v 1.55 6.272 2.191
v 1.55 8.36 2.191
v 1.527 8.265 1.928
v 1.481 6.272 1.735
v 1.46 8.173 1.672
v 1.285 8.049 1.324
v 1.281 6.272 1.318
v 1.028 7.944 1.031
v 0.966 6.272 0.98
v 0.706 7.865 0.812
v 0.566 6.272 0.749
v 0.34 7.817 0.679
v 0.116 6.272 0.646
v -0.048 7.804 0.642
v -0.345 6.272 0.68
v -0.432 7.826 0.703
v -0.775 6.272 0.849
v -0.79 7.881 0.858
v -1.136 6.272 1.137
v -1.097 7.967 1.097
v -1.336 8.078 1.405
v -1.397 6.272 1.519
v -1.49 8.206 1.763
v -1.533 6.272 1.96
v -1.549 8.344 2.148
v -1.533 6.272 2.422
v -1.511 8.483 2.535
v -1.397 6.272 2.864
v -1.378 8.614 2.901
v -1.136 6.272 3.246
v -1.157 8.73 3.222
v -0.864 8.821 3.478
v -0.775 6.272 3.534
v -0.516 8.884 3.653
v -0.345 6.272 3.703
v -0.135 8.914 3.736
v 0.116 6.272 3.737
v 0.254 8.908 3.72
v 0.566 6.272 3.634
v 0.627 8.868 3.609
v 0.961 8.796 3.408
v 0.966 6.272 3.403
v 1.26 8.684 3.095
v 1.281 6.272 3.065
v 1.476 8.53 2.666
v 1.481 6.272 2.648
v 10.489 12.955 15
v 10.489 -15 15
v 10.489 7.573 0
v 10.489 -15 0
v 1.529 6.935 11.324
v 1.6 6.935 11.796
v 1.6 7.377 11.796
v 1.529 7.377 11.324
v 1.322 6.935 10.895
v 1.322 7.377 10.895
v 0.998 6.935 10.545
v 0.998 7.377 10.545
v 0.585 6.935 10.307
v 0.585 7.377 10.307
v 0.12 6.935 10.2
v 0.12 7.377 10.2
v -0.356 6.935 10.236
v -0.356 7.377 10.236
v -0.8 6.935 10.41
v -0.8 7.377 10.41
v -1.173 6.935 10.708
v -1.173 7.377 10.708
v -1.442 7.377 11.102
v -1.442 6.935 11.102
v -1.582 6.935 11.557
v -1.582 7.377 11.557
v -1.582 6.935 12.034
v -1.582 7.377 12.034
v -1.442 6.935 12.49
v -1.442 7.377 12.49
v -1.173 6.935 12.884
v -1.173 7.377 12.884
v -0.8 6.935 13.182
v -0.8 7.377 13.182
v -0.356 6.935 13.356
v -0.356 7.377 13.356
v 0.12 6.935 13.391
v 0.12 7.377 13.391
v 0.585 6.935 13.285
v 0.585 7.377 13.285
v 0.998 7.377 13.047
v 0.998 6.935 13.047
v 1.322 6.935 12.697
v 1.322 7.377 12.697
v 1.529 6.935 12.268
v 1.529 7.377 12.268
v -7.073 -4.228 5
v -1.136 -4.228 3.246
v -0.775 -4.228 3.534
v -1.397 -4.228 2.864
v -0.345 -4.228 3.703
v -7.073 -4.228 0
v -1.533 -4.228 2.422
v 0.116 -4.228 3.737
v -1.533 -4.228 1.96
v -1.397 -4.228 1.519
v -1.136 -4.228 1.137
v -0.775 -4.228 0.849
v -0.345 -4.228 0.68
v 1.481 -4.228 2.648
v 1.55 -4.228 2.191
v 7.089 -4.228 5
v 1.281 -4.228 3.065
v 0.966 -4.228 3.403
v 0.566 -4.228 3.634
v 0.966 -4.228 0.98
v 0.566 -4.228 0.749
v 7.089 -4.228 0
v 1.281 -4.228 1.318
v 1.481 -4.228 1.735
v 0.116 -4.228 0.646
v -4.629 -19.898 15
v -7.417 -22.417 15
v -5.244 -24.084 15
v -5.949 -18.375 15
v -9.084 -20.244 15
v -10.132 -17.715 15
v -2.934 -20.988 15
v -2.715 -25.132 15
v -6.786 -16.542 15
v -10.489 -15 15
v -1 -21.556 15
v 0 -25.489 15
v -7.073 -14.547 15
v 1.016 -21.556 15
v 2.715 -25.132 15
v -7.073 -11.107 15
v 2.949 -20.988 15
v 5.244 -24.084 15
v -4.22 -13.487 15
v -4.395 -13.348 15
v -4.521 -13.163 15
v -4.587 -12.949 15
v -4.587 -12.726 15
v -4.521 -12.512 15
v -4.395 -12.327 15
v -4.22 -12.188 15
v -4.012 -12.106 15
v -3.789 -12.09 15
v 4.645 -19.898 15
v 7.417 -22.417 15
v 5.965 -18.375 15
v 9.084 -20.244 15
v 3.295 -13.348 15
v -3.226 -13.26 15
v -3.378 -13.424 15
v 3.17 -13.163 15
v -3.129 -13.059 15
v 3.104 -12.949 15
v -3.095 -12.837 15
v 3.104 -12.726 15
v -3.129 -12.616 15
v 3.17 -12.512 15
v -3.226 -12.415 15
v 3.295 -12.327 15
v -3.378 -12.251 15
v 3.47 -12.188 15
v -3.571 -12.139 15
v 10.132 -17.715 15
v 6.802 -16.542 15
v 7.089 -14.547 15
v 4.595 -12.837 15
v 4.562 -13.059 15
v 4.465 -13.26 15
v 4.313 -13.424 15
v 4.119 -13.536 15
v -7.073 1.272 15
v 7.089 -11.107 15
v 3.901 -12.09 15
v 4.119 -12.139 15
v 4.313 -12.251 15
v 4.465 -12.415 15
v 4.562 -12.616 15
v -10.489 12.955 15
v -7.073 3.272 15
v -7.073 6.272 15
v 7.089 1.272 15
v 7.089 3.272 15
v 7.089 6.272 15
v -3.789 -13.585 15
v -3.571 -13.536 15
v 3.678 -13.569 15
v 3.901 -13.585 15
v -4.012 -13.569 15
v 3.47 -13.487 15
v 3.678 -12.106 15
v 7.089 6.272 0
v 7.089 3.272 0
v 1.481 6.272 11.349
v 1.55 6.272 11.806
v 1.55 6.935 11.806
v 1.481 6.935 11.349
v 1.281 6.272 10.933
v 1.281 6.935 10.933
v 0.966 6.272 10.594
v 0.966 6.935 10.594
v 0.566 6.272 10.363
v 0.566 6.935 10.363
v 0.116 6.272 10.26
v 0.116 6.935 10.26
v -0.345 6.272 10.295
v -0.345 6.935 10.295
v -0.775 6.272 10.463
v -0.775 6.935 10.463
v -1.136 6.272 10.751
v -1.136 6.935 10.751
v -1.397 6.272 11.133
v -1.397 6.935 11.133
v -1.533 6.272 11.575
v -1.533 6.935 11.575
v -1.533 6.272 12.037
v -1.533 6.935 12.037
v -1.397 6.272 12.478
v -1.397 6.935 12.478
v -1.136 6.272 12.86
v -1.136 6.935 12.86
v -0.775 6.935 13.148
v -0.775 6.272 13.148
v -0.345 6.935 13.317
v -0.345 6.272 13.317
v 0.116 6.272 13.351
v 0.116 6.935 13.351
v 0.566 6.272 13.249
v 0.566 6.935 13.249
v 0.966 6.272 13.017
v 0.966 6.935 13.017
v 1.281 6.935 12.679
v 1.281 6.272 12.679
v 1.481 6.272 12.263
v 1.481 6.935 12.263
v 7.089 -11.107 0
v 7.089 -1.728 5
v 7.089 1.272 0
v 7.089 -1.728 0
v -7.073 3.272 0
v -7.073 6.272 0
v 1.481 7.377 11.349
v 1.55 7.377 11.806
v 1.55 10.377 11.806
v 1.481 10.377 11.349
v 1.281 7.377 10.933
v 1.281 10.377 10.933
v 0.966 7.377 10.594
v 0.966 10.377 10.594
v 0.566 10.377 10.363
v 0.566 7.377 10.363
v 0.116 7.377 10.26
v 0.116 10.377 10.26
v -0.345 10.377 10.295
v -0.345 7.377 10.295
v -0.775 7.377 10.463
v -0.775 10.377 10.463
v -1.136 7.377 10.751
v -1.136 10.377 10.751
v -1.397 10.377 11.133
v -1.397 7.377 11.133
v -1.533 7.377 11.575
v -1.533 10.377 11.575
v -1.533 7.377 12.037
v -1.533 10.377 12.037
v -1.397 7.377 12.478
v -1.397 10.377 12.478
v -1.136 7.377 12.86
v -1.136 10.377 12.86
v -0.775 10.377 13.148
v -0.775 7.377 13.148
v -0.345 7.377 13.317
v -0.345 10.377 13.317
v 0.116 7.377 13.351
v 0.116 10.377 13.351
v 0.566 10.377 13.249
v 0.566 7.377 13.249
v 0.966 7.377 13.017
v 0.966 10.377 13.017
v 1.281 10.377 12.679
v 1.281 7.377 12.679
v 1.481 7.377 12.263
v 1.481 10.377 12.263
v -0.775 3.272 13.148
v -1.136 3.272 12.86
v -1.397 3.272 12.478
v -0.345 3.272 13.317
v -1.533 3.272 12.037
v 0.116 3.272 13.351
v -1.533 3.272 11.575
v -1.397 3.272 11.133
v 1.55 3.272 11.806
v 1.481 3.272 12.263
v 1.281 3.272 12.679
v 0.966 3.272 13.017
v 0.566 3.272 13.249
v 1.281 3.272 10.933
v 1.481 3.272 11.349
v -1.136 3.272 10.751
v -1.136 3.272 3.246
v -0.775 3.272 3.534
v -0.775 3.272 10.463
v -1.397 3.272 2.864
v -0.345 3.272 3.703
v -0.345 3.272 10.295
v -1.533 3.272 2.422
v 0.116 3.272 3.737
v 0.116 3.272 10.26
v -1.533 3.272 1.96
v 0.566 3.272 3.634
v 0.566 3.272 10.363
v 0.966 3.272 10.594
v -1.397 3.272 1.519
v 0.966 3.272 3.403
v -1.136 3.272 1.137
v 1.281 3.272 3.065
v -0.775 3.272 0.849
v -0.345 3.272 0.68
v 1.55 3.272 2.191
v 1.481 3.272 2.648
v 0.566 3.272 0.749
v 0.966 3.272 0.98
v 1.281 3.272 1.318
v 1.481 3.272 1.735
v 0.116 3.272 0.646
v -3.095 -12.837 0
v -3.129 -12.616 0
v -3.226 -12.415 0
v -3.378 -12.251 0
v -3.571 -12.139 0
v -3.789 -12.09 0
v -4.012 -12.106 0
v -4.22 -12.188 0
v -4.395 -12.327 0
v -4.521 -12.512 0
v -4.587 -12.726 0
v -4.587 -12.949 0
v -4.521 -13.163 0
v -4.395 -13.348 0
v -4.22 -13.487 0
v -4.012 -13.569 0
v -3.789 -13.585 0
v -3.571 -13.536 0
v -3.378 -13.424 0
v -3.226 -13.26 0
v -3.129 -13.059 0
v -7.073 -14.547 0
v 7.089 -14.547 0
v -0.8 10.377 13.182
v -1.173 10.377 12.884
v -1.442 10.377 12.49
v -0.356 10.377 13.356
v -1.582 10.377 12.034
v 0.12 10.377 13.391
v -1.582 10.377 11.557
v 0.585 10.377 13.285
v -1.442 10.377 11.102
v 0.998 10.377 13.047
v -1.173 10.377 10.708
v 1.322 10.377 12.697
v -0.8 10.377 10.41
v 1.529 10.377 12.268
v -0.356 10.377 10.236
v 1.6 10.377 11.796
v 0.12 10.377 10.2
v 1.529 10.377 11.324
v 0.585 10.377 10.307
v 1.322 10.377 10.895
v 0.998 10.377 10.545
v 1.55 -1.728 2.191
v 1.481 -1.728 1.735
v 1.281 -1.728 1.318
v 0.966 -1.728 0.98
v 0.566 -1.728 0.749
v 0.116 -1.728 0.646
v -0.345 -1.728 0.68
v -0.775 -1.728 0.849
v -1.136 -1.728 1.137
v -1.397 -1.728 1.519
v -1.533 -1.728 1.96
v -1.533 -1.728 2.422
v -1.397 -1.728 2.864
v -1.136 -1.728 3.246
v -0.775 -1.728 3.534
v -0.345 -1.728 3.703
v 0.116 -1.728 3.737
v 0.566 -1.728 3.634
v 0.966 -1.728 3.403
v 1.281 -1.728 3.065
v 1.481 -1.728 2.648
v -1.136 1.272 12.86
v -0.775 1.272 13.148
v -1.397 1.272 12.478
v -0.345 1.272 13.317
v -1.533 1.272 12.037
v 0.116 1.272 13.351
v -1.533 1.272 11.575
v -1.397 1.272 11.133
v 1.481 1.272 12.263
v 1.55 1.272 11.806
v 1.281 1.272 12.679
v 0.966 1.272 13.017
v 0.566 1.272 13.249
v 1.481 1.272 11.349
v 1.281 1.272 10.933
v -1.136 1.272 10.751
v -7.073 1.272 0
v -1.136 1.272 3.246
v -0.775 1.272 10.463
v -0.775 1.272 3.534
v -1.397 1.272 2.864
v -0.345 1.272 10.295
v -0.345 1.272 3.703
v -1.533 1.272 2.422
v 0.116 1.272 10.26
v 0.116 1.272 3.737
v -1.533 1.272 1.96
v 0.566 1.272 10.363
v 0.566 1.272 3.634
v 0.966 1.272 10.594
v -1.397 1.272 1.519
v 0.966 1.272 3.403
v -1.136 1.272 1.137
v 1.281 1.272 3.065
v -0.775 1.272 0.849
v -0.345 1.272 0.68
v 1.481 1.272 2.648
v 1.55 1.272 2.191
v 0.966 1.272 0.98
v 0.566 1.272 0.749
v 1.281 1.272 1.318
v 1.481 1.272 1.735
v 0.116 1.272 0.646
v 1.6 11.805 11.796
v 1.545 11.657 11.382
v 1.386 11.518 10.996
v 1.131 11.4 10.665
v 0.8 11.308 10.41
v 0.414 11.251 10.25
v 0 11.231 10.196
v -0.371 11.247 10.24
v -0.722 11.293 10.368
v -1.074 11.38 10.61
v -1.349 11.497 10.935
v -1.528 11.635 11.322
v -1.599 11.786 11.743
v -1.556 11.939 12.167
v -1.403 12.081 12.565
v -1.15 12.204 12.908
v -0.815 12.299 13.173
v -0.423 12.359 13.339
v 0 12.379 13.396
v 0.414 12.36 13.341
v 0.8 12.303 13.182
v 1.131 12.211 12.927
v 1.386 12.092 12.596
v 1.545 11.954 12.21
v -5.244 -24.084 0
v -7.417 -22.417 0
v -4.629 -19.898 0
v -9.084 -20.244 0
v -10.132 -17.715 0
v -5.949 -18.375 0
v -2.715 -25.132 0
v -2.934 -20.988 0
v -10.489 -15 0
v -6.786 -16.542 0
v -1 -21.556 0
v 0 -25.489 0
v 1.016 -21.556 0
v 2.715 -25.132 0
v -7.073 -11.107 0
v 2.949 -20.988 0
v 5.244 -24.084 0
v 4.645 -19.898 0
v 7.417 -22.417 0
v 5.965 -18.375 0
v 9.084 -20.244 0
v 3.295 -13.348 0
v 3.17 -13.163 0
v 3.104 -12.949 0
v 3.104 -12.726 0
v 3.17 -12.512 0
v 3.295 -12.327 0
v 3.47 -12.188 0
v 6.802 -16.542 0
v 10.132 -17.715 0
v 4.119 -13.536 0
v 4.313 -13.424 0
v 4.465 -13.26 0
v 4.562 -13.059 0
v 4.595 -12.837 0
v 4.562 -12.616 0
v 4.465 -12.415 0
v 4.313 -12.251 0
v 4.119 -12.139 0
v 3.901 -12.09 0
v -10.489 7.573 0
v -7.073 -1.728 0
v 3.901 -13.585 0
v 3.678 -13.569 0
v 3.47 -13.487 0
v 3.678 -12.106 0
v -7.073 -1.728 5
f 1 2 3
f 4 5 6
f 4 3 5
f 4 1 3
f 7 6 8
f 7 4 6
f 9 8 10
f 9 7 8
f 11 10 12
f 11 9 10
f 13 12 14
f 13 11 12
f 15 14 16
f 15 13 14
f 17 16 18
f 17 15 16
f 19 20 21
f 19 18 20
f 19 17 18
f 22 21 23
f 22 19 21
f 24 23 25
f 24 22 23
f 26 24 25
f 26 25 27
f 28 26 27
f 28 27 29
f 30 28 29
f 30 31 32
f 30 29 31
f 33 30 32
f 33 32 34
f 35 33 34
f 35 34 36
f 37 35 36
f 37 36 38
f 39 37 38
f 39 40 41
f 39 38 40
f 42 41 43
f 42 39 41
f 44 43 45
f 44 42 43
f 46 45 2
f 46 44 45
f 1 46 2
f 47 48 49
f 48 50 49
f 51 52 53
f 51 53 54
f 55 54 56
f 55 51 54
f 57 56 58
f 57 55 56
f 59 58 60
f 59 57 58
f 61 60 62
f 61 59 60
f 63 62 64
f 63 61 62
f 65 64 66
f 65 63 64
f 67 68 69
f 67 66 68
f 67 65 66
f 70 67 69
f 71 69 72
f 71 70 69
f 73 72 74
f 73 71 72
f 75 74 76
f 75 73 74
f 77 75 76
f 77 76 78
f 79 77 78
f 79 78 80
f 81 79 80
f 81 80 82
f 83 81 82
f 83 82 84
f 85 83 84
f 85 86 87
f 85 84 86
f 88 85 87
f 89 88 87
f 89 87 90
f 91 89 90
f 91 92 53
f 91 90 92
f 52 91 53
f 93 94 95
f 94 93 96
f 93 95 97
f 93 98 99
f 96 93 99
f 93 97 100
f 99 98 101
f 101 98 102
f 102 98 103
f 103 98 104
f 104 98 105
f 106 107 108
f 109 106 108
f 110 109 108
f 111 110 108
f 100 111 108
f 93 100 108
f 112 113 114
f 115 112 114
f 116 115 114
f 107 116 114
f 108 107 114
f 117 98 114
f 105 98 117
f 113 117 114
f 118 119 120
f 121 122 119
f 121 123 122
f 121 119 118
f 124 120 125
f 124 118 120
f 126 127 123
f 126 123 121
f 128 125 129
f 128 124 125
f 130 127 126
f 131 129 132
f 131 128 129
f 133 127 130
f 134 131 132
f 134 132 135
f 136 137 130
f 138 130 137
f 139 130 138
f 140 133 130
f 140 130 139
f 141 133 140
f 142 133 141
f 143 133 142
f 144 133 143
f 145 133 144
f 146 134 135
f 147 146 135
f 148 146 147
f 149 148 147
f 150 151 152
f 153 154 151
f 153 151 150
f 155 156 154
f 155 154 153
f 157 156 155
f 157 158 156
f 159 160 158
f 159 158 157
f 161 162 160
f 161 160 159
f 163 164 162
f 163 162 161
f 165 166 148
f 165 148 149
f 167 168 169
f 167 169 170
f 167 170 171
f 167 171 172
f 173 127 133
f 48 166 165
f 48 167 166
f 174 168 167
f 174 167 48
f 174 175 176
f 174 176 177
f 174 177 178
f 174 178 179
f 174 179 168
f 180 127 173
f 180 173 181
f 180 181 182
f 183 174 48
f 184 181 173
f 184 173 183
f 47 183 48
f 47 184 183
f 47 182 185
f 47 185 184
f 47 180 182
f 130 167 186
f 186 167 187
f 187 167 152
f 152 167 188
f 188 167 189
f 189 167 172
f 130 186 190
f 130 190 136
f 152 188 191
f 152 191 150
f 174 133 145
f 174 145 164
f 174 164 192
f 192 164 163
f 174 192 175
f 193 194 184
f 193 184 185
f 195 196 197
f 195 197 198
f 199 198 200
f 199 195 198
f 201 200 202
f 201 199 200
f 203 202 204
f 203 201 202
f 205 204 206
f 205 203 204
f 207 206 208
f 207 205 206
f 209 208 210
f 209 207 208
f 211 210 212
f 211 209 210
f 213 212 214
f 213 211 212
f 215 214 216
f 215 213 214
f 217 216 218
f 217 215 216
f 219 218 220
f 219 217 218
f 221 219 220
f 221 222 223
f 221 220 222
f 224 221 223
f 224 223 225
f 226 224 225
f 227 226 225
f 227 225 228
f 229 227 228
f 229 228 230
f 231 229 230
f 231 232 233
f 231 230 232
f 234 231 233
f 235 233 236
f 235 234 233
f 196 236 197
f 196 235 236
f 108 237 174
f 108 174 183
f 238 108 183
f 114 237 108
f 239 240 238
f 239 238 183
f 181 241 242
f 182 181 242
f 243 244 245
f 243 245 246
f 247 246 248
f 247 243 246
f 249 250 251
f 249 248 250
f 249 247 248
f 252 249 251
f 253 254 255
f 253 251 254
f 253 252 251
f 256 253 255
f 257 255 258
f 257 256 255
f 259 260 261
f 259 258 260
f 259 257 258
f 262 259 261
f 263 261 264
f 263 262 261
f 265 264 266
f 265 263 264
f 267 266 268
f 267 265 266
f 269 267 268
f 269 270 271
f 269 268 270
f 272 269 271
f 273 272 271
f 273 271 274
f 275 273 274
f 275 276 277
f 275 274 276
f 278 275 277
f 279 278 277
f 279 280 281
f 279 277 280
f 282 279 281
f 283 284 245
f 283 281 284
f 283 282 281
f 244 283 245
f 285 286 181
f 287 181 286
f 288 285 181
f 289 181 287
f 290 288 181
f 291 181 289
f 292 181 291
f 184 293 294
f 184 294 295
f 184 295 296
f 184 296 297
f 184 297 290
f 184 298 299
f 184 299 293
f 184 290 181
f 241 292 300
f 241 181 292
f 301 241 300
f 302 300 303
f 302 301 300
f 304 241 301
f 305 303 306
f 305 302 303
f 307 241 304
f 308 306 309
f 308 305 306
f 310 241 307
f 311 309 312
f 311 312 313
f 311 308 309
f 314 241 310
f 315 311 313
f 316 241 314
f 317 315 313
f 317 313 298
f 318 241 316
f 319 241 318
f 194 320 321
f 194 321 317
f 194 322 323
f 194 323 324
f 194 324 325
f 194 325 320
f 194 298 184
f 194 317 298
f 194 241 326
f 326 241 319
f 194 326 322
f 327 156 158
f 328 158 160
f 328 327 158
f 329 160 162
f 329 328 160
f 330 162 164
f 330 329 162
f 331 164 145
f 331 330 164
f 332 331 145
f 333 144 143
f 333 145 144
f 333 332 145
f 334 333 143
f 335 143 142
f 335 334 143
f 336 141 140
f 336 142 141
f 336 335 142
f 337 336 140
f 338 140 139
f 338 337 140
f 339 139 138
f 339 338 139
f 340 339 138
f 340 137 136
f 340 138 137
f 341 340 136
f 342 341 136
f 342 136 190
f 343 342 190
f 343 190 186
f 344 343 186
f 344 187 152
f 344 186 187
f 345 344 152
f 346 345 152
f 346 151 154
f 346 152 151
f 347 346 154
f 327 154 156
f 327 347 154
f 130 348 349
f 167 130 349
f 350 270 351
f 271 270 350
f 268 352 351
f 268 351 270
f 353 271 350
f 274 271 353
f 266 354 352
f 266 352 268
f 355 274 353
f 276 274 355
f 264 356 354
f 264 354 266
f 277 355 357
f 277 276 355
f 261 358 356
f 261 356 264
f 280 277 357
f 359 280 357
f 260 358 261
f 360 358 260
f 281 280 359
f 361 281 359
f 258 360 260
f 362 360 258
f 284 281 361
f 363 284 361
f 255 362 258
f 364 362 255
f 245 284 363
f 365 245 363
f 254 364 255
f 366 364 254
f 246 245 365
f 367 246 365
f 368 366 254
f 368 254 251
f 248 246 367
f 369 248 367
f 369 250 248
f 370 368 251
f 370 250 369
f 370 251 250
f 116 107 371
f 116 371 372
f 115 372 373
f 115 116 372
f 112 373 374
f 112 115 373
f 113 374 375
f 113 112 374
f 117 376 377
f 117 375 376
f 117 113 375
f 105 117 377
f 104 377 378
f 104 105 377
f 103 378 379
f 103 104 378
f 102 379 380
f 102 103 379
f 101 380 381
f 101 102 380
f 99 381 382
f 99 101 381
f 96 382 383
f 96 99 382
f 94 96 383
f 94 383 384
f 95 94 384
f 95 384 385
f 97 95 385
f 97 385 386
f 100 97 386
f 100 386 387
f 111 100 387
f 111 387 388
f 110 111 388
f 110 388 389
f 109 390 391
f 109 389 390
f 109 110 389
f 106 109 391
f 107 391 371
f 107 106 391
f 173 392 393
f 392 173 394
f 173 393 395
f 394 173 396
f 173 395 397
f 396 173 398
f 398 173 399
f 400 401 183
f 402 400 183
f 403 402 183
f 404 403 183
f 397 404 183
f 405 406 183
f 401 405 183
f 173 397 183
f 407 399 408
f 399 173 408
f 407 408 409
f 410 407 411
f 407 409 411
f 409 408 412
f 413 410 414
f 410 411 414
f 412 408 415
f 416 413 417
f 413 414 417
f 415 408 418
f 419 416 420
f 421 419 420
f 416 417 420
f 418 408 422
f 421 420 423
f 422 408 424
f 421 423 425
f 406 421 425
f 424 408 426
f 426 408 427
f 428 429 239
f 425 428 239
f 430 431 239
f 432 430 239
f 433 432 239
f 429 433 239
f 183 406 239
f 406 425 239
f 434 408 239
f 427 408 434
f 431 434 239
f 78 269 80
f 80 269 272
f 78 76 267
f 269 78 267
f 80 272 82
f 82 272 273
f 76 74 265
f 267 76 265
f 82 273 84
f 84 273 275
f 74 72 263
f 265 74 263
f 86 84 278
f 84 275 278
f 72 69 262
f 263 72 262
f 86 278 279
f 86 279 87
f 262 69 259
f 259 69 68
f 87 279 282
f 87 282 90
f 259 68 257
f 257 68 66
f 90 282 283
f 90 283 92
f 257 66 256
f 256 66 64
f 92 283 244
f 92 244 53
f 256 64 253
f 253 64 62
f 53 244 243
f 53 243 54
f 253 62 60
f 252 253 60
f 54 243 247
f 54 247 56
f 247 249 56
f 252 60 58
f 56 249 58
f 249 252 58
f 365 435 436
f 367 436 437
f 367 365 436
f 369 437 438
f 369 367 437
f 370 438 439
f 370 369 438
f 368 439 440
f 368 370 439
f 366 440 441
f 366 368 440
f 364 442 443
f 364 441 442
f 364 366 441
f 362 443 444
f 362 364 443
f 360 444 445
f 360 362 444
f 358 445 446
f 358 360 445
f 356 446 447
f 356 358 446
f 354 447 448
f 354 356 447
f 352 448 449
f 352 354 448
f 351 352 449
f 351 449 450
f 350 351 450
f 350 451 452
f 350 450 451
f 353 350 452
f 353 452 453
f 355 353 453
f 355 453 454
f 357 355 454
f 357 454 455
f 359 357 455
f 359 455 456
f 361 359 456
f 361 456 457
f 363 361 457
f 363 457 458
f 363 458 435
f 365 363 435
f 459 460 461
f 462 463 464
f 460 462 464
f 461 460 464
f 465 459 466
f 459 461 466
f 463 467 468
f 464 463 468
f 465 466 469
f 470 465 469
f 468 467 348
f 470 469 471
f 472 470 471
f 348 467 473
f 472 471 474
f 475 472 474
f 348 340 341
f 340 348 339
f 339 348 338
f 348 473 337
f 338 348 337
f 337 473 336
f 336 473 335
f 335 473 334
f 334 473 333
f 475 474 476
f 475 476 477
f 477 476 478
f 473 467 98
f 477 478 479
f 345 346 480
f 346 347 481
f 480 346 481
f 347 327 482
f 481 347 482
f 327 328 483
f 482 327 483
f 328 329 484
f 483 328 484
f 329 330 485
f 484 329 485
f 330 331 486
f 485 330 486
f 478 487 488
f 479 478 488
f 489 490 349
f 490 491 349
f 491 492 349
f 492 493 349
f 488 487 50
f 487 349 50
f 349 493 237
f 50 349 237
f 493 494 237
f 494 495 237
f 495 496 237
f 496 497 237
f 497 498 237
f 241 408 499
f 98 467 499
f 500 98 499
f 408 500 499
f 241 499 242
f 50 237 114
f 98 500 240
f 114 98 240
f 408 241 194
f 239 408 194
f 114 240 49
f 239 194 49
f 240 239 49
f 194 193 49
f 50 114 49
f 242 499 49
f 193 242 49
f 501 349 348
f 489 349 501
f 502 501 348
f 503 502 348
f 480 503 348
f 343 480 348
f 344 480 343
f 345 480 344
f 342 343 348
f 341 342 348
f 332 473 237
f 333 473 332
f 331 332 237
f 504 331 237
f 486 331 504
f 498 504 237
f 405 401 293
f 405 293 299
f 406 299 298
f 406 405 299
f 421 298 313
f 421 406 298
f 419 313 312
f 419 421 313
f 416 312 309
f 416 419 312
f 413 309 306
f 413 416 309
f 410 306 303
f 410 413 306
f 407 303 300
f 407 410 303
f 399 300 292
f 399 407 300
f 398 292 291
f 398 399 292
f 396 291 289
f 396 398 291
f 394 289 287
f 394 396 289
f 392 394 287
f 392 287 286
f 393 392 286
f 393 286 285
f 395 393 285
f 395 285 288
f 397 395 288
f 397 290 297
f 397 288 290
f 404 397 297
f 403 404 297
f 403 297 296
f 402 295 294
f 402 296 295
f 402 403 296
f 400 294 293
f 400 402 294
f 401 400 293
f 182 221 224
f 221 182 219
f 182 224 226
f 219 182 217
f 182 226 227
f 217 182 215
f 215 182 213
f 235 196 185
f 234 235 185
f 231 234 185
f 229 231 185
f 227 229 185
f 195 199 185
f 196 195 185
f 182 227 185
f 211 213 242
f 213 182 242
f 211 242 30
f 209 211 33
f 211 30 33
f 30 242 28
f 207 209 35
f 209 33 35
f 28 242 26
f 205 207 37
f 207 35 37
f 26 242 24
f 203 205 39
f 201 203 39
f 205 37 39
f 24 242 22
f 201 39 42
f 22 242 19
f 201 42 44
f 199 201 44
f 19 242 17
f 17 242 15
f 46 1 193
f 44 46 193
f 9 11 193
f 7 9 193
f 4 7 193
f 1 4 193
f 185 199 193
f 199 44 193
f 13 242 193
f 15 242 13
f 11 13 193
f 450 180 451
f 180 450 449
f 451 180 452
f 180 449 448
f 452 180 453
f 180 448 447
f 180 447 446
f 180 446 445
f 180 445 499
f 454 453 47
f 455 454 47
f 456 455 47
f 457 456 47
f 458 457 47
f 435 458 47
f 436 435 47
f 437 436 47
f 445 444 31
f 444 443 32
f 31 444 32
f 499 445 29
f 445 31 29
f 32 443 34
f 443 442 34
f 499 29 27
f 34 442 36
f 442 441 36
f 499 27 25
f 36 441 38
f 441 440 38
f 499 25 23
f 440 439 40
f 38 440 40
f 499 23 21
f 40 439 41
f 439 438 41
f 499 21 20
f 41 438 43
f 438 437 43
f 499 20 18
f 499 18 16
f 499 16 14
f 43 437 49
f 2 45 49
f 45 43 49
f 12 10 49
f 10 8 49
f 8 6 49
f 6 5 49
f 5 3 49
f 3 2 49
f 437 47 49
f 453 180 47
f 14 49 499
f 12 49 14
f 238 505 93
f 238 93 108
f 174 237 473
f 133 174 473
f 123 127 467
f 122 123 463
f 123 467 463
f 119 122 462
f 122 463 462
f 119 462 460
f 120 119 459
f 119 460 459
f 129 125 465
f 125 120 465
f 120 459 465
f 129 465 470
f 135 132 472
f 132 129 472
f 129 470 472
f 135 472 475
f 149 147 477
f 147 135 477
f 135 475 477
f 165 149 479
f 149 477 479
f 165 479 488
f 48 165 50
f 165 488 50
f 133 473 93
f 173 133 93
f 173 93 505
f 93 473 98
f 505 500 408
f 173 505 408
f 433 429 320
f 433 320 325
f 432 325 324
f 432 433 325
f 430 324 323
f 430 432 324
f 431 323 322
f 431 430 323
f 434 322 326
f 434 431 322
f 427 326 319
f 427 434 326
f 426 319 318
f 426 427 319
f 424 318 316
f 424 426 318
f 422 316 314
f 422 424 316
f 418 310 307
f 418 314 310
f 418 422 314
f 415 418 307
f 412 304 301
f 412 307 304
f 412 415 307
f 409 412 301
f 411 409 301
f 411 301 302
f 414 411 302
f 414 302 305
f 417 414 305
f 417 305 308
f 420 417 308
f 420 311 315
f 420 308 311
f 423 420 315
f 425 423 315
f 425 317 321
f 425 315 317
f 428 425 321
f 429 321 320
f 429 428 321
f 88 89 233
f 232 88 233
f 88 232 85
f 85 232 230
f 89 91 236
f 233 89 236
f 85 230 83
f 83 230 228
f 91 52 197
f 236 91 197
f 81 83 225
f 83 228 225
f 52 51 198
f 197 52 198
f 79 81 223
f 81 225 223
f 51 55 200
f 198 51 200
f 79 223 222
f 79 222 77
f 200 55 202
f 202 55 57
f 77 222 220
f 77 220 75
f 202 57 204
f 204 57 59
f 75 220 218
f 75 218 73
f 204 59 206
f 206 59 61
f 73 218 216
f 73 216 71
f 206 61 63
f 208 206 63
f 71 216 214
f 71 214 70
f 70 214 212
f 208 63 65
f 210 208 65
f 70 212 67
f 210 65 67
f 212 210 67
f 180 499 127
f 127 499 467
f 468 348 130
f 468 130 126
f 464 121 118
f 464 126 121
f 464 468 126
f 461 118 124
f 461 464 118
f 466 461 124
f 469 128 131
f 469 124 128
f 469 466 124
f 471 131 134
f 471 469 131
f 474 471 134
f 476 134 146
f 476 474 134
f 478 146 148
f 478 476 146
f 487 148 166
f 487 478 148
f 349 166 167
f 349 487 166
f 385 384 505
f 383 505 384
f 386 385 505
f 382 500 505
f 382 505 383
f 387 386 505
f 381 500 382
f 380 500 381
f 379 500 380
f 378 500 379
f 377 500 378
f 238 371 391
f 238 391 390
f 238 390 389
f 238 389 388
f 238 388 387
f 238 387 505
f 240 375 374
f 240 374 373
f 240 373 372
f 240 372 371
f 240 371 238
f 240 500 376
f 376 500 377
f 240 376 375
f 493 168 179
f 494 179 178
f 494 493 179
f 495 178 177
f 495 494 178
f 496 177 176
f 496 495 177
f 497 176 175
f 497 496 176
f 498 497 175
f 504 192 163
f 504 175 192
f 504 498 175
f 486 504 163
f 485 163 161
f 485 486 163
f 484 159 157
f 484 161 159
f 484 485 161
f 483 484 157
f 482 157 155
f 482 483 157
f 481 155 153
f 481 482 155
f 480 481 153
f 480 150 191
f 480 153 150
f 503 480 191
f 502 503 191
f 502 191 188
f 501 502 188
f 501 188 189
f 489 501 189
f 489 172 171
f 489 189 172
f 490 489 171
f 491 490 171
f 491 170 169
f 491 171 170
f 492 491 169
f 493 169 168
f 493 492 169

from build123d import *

# Parameters (mm, degrees)
SKETCH2_W                = 14.162138344
SKETCH2_H                = 3.4
SKETCH2_W_2              = 7.073181434
SKETCH2_H_2              = 3.44
SKETCH2_R                = 0.75
SKETCH2_W_3              = 7.08895691
BOSS_EXTRUDE1_DEPTH      = 20
BOSS_EXTRUDE2_START      = -11
BOSS_EXTRUDE2_DEPTH      = 23
CUT_EXTRUDE1_DEPTH       = 23
BOSS_EXTRUDE3_DEPTH      = 20
SKETCH8_R                = 1.6
CUT_EXTRUDE2_DEPTH       = 50
CUT_EXTRUDE3_START       = 9
SKETCH9_W                = 15
SKETCH9_H                = 3
CUT_EXTRUDE3_DEPTH       = 50
SKETCH10_W               = 8
SKETCH10_H               = 3.4
BOSS_EXTRUDE4_DEPTH      = 20
CUT_EXTRUDE4_DEPTH       = 15
CUT_EXTRUDE6_DEPTH       = 15
CUT_EXTRUDE7_DEPTH       = 14.77685015
CUT_EXTRUDE7_DEPTH_BACK  = 26.48895691
CUT_EXTRUDE8_DEPTH       = 11.48895691
CUT_EXTRUDE8_DEPTH_BACK  = 11.48895691
CUT_EXTRUDE9_DEPTH       = 11.48895691
CUT_EXTRUDE9_DEPTH_BACK  = 11.48895691
SKETCH16_W               = 14.162138344
SKETCH16_H               = 9.377104558
CUT_EXTRUDE10_DEPTH      = 16.0000001
CUT_EXTRUDE10_DEPTH_BACK = 15.024346574
BOSS_EXTRUDE5_DEPTH      = 15
SKETCH18_W               = 14.162138344
SKETCH18_H               = 2
BOSS_EXTRUDE6_DEPTH      = 15
SKETCH19_W               = 15
SKETCH19_H               = 3
BOSS_EXTRUDE7_DEPTH      = 15
CUT_EXTRUDE11_DEPTH      = 11.48895691
CUT_EXTRUDE11_DEPTH_BACK = 11.48895691
SKETCH21_R               = 1.55
CUT_EXTRUDE12_DEPTH      = 20
SKETCH23_W               = 14.162138344
SKETCH23_H               = 12.378444436
CUT_EXTRUDE13_DEPTH      = 16
CUT_EXTRUDE13_DEPTH_BACK = 15.024346574
SKETCH24_W               = 14.162138344
SKETCH24_H               = 2.5
BOSS_EXTRUDE8_DEPTH      = 5
CUT_EXTRUDE14_START      = -10
SKETCH25_R               = 1.55
CUT_EXTRUDE14_DEPTH      = 20


with BuildPart() as part:
    # Sketch2 → Boss-Extrude1 (new body)
    with BuildSketch(Plane.XY):
        with BuildLine():
            Line((-10.48895691, 0), (-10.48895691, -15))
            ThreePointArc((-10.48895691, -15), (0, -25.48895691), (10.48895691, -15))
            Line((10.48895691, -15), (10.48895691, 0))
            ThreePointArc((10.48895691, 0), (0, 10.48895691), (-10.48895691, 0))
        make_face()
        with BuildLine():
            ThreePointArc((-7.073181434, -14.546841059), (0.007887738, -21.627910231), (7.08895691, -14.546841059))
            Line((7.08895691, -14.546841059), (7.08895691, -0.433251968))
            ThreePointArc((7.08895691, -0.433251968), (0.007887738, 6.647817204), (-7.073181434, -0.433251968))
            Line((-7.073181434, -0.433251968), (-7.073181434, -14.546841059))
        make_face(mode=Mode.SUBTRACT)
        with Locations((0.007887738, -4.477329194)):
            Rectangle(SKETCH2_W, SKETCH2_H)
        with Locations((-3.536590717, -12.826841059)):
            Rectangle(SKETCH2_W_2, SKETCH2_H_2)
        with Locations((-3.845252141, -12.837457066)):
            Circle(SKETCH2_R, mode=Mode.SUBTRACT)
        with Locations((3.544478455, -12.826841059)):
            Rectangle(SKETCH2_W_3, SKETCH2_H_2)
        with Locations((3.845252141, -12.837457066)):
            Circle(SKETCH2_R, mode=Mode.SUBTRACT)
    extrude(amount=BOSS_EXTRUDE1_DEPTH)



with BuildPart() as body_2:
    # Sketch5 → Boss-Extrude2 (new body)
    with BuildSketch(Plane(origin=(0, 0, 0), x_dir=(0, 0, -1), z_dir=(1, 0, 0)).offset(BOSS_EXTRUDE2_START)):
        Polygon((-20, 10.48895691), (-20, 13.77685015), (0, 10.48895691), align=None)
    extrude(amount=BOSS_EXTRUDE2_DEPTH)

    # Sketch6 → Cut-Extrude1 (cut)
    with BuildSketch(Plane.XY):
        Polygon((-10.48895691, 0), (-10.48895691, 15.860273687), (-12.486191968, 15.860273687), (-12.486191968, -0.695838208), align=None)
        Polygon((10.48895691, 0), (10.48895691, 17.140856928), (14.451791198, 17.140856928), (14.085910272, 0), align=None)
    extrude(amount=CUT_EXTRUDE1_DEPTH, mode=Mode.SUBTRACT)


with BuildPart() as part_1:
    add(part.part)

    add(body_2.part)  # Boss-Extrude3 merges body 2
    # Sketch7 → Boss-Extrude3 (add)
    with BuildSketch(Plane.XY):
        Polygon((-10.48895691, 10.48895691), (-10.48895691, 0), (-4.00693271, 9.117877526), (3.3932631, 9.117877526), (10.48895691, 0), (10.48895691, 10.48895691), align=None)
    extrude(amount=BOSS_EXTRUDE3_DEPTH)

    # Sketch8 → Cut-Extrude2 (cut)
    with BuildSketch(Plane(origin=(0, 0, 0), x_dir=(1, 0, 0), z_dir=(0, 1, 0))):
        with Locations((0, -11.795956347)):
            Circle(SKETCH8_R)
    extrude(amount=CUT_EXTRUDE2_DEPTH, mode=Mode.SUBTRACT)

    # Sketch9 → Cut-Extrude3 (cut)
    with BuildSketch(Plane.XY.offset(CUT_EXTRUDE3_START)):
        with Locations((0, 8.87685015)):
            Rectangle(SKETCH9_W, SKETCH9_H)
    extrude(amount=CUT_EXTRUDE3_DEPTH, mode=Mode.SUBTRACT)

    # Sketch10 → Boss-Extrude4 (add)
    with BuildSketch(Plane.XY):
        with Locations((0, -4.477329194)):
            Rectangle(SKETCH10_W, SKETCH10_H)
    extrude(amount=-BOSS_EXTRUDE4_DEPTH)

    # Sketch11 → Cut-Extrude4 (cut)
    with BuildSketch(Plane(origin=(0, 0, 0), x_dir=(1, 0, 0), z_dir=(0, 1, 0))):
        with BuildLine():
            ThreePointArc((4, 27.93345462), (0, 23.93345462), (-4, 27.93345462))
            Line((-4, 27.93345462), (-5.669072563, 15.992564213))
            Line((-5.669072563, 15.992564213), (5.557395145, 15.474390906))
            Line((5.557395145, 15.474390906), (4, 27.93345462))
        make_face()
    extrude(amount=-CUT_EXTRUDE4_DEPTH, mode=Mode.SUBTRACT)

    # Sketch12 → Cut-Extrude6 (cut)
    with BuildSketch(Plane(origin=(0, 0, 0), x_dir=(1, 0, 0), z_dir=(0, 1, 0))):
        with BuildLine():
            ThreePointArc((-1.5, 10), (0, 8.5), (1.5, 10))
            ThreePointArc((1.5, 10), (1.499895352, 10.017718186), (1.499581421, 10.0354339))
            Line((1.499581421, 10.0354339), (-1.499581421, 10.0354339))
            ThreePointArc((-1.499581421, 10.0354339), (-1.499895352, 10.017718186), (-1.5, 10))
        make_face()
        with BuildLine():
            Line((-1.499581421, 10.0354339), (1.499581421, 10.0354339))
            ThreePointArc((1.499581421, 10.0354339), (0, 11.5), (-1.499581421, 10.0354339))
        make_face()
        with BuildLine():
            Line((-1.5, 0), (1.5, 0))
            Line((1.5, 0), (1.5, 10))
            ThreePointArc((1.5, 10), (0, 8.5), (-1.5, 10))
            Line((-1.5, 10), (-1.5, 0))
        make_face()
    extrude(amount=-CUT_EXTRUDE6_DEPTH, mode=Mode.SUBTRACT)

    # Sketch13 → Cut-Extrude7 (cut, two sides)
    with BuildSketch(Plane(origin=(0, 0, 0), x_dir=(1, 0, 0), z_dir=(0, 1, 0))) as cut_extrude7_sk:
        with BuildLine():
            Line((-7.439128098, 19.178498244), (-4, 10.024346574))
            ThreePointArc((-4, 10.024346574), (0, 14.024346574), (4, 10.024346574))
            Line((4, 10.024346574), (9.668085042, 17.513702334))
            Line((9.668085042, 17.513702334), (-7.439128098, 19.178498244))
        make_face()
    extrude(amount=CUT_EXTRUDE7_DEPTH, mode=Mode.SUBTRACT)
    extrude(cut_extrude7_sk.sketch, amount=-CUT_EXTRUDE7_DEPTH_BACK, mode=Mode.SUBTRACT)

    # Sketch14 → Cut-Extrude8 (cut, two sides)
    with BuildSketch(Plane(origin=(0, 0, 0), x_dir=(0, 0, -1), z_dir=(1, 0, 0))) as cut_extrude8_sk:
        Polygon((-26.730054166, 15.422520577), (-23.0368577, -28.4462079), (-15, -25.48895691), (-15, 13.72392169), align=None)
    extrude(amount=CUT_EXTRUDE8_DEPTH, mode=Mode.SUBTRACT)
    extrude(cut_extrude8_sk.sketch, amount=-CUT_EXTRUDE8_DEPTH_BACK, mode=Mode.SUBTRACT)

    # Sketch15 → Cut-Extrude9 (cut, two sides)
    with BuildSketch(Plane(origin=(0, 0, 0), x_dir=(0, 0, -1), z_dir=(1, 0, 0))) as cut_extrude9_sk:
        Polygon((-15, 12.95487684), (0, 7.573497647), (5.521522654, 8.824312447), (5.521522654, 13.501272135), (-15.144113177, 13.990721405), align=None)
    extrude(amount=CUT_EXTRUDE9_DEPTH, mode=Mode.SUBTRACT)
    extrude(cut_extrude9_sk.sketch, amount=-CUT_EXTRUDE9_DEPTH_BACK, mode=Mode.SUBTRACT)

    # Sketch16 → Cut-Extrude10 (cut, two sides)
    with BuildSketch(Plane.XY) as cut_extrude10_sk:
        with Locations((0.007887738, 1.911223085)):
            Rectangle(SKETCH16_W, SKETCH16_H)
    extrude(amount=CUT_EXTRUDE10_DEPTH, mode=Mode.SUBTRACT)
    extrude(cut_extrude10_sk.sketch, amount=-CUT_EXTRUDE10_DEPTH_BACK, mode=Mode.SUBTRACT)

    # Sketch17 → Boss-Extrude5 (add, through all)
    with BuildSketch(Plane.XY):
        Polygon((-7.073181434, 6.271603377), (7.08895691, 6.271603377), (7.08895691, 6.934816107), (-7.073181434, 6.934816107), (-7.073181434, 6.599775364), (-7.073181434, 6.43568937), align=None)
    extrude(amount=BOSS_EXTRUDE5_DEPTH)

    # Sketch18 → Boss-Extrude6 (add, through all)
    with BuildSketch(Plane.XY):
        with Locations((0.007887738, 2.271603377)):
            Rectangle(SKETCH18_W, SKETCH18_H)
    extrude(amount=BOSS_EXTRUDE6_DEPTH)

    # Sketch19 → Boss-Extrude7 (add)
    with BuildSketch(Plane.XY):
        with Locations((0, 8.87685015)):
            Rectangle(SKETCH19_W, SKETCH19_H)
    extrude(amount=BOSS_EXTRUDE7_DEPTH)

    # Sketch20 → Cut-Extrude11 (cut, two sides)
    with BuildSketch(Plane(origin=(0, 0, 0), x_dir=(0, 0, -1), z_dir=(1, 0, 0))) as cut_extrude11_sk:
        Polygon((-15, 12.95487684), (0, 7.573497647), (2.534300376, 12.95487684), align=None)
    extrude(amount=CUT_EXTRUDE11_DEPTH, mode=Mode.SUBTRACT)
    extrude(cut_extrude11_sk.sketch, amount=-CUT_EXTRUDE11_DEPTH_BACK, mode=Mode.SUBTRACT)

    # Sketch21 → Cut-Extrude12 (cut)
    with BuildSketch(Plane(origin=(0, 0, 0), x_dir=(1, 0, 0), z_dir=(0, 1, 0))):
        with Locations((0, -11.805650833)):
            Circle(SKETCH21_R)
    extrude(amount=CUT_EXTRUDE12_DEPTH, mode=Mode.SUBTRACT)

    # Sketch23 → Cut-Extrude13 (cut, two sides)
    with BuildSketch(Plane.XY) as cut_extrude13_sk:
        with Locations((0.007887738, -4.917618841)):
            Rectangle(SKETCH23_W, SKETCH23_H)
    extrude(amount=CUT_EXTRUDE13_DEPTH, mode=Mode.SUBTRACT)
    extrude(cut_extrude13_sk.sketch, amount=-CUT_EXTRUDE13_DEPTH_BACK, mode=Mode.SUBTRACT)

    # Sketch24 → Boss-Extrude8 (add)
    with BuildSketch(Plane.XY):
        with Locations((0.007887738, -2.978396623)):
            Rectangle(SKETCH24_W, SKETCH24_H)
    extrude(amount=BOSS_EXTRUDE8_DEPTH)

    # Sketch25 → Cut-Extrude14 (cut)
    with BuildSketch(Plane(origin=(0, 0, 0), x_dir=(1, 0, 0), z_dir=(0, 1, 0)).offset(CUT_EXTRUDE14_START)):
        with Locations((0, -2.191424263)):
            Circle(SKETCH25_R)
    extrude(amount=CUT_EXTRUDE14_DEPTH, mode=Mode.SUBTRACT)


solid = part_1.part
